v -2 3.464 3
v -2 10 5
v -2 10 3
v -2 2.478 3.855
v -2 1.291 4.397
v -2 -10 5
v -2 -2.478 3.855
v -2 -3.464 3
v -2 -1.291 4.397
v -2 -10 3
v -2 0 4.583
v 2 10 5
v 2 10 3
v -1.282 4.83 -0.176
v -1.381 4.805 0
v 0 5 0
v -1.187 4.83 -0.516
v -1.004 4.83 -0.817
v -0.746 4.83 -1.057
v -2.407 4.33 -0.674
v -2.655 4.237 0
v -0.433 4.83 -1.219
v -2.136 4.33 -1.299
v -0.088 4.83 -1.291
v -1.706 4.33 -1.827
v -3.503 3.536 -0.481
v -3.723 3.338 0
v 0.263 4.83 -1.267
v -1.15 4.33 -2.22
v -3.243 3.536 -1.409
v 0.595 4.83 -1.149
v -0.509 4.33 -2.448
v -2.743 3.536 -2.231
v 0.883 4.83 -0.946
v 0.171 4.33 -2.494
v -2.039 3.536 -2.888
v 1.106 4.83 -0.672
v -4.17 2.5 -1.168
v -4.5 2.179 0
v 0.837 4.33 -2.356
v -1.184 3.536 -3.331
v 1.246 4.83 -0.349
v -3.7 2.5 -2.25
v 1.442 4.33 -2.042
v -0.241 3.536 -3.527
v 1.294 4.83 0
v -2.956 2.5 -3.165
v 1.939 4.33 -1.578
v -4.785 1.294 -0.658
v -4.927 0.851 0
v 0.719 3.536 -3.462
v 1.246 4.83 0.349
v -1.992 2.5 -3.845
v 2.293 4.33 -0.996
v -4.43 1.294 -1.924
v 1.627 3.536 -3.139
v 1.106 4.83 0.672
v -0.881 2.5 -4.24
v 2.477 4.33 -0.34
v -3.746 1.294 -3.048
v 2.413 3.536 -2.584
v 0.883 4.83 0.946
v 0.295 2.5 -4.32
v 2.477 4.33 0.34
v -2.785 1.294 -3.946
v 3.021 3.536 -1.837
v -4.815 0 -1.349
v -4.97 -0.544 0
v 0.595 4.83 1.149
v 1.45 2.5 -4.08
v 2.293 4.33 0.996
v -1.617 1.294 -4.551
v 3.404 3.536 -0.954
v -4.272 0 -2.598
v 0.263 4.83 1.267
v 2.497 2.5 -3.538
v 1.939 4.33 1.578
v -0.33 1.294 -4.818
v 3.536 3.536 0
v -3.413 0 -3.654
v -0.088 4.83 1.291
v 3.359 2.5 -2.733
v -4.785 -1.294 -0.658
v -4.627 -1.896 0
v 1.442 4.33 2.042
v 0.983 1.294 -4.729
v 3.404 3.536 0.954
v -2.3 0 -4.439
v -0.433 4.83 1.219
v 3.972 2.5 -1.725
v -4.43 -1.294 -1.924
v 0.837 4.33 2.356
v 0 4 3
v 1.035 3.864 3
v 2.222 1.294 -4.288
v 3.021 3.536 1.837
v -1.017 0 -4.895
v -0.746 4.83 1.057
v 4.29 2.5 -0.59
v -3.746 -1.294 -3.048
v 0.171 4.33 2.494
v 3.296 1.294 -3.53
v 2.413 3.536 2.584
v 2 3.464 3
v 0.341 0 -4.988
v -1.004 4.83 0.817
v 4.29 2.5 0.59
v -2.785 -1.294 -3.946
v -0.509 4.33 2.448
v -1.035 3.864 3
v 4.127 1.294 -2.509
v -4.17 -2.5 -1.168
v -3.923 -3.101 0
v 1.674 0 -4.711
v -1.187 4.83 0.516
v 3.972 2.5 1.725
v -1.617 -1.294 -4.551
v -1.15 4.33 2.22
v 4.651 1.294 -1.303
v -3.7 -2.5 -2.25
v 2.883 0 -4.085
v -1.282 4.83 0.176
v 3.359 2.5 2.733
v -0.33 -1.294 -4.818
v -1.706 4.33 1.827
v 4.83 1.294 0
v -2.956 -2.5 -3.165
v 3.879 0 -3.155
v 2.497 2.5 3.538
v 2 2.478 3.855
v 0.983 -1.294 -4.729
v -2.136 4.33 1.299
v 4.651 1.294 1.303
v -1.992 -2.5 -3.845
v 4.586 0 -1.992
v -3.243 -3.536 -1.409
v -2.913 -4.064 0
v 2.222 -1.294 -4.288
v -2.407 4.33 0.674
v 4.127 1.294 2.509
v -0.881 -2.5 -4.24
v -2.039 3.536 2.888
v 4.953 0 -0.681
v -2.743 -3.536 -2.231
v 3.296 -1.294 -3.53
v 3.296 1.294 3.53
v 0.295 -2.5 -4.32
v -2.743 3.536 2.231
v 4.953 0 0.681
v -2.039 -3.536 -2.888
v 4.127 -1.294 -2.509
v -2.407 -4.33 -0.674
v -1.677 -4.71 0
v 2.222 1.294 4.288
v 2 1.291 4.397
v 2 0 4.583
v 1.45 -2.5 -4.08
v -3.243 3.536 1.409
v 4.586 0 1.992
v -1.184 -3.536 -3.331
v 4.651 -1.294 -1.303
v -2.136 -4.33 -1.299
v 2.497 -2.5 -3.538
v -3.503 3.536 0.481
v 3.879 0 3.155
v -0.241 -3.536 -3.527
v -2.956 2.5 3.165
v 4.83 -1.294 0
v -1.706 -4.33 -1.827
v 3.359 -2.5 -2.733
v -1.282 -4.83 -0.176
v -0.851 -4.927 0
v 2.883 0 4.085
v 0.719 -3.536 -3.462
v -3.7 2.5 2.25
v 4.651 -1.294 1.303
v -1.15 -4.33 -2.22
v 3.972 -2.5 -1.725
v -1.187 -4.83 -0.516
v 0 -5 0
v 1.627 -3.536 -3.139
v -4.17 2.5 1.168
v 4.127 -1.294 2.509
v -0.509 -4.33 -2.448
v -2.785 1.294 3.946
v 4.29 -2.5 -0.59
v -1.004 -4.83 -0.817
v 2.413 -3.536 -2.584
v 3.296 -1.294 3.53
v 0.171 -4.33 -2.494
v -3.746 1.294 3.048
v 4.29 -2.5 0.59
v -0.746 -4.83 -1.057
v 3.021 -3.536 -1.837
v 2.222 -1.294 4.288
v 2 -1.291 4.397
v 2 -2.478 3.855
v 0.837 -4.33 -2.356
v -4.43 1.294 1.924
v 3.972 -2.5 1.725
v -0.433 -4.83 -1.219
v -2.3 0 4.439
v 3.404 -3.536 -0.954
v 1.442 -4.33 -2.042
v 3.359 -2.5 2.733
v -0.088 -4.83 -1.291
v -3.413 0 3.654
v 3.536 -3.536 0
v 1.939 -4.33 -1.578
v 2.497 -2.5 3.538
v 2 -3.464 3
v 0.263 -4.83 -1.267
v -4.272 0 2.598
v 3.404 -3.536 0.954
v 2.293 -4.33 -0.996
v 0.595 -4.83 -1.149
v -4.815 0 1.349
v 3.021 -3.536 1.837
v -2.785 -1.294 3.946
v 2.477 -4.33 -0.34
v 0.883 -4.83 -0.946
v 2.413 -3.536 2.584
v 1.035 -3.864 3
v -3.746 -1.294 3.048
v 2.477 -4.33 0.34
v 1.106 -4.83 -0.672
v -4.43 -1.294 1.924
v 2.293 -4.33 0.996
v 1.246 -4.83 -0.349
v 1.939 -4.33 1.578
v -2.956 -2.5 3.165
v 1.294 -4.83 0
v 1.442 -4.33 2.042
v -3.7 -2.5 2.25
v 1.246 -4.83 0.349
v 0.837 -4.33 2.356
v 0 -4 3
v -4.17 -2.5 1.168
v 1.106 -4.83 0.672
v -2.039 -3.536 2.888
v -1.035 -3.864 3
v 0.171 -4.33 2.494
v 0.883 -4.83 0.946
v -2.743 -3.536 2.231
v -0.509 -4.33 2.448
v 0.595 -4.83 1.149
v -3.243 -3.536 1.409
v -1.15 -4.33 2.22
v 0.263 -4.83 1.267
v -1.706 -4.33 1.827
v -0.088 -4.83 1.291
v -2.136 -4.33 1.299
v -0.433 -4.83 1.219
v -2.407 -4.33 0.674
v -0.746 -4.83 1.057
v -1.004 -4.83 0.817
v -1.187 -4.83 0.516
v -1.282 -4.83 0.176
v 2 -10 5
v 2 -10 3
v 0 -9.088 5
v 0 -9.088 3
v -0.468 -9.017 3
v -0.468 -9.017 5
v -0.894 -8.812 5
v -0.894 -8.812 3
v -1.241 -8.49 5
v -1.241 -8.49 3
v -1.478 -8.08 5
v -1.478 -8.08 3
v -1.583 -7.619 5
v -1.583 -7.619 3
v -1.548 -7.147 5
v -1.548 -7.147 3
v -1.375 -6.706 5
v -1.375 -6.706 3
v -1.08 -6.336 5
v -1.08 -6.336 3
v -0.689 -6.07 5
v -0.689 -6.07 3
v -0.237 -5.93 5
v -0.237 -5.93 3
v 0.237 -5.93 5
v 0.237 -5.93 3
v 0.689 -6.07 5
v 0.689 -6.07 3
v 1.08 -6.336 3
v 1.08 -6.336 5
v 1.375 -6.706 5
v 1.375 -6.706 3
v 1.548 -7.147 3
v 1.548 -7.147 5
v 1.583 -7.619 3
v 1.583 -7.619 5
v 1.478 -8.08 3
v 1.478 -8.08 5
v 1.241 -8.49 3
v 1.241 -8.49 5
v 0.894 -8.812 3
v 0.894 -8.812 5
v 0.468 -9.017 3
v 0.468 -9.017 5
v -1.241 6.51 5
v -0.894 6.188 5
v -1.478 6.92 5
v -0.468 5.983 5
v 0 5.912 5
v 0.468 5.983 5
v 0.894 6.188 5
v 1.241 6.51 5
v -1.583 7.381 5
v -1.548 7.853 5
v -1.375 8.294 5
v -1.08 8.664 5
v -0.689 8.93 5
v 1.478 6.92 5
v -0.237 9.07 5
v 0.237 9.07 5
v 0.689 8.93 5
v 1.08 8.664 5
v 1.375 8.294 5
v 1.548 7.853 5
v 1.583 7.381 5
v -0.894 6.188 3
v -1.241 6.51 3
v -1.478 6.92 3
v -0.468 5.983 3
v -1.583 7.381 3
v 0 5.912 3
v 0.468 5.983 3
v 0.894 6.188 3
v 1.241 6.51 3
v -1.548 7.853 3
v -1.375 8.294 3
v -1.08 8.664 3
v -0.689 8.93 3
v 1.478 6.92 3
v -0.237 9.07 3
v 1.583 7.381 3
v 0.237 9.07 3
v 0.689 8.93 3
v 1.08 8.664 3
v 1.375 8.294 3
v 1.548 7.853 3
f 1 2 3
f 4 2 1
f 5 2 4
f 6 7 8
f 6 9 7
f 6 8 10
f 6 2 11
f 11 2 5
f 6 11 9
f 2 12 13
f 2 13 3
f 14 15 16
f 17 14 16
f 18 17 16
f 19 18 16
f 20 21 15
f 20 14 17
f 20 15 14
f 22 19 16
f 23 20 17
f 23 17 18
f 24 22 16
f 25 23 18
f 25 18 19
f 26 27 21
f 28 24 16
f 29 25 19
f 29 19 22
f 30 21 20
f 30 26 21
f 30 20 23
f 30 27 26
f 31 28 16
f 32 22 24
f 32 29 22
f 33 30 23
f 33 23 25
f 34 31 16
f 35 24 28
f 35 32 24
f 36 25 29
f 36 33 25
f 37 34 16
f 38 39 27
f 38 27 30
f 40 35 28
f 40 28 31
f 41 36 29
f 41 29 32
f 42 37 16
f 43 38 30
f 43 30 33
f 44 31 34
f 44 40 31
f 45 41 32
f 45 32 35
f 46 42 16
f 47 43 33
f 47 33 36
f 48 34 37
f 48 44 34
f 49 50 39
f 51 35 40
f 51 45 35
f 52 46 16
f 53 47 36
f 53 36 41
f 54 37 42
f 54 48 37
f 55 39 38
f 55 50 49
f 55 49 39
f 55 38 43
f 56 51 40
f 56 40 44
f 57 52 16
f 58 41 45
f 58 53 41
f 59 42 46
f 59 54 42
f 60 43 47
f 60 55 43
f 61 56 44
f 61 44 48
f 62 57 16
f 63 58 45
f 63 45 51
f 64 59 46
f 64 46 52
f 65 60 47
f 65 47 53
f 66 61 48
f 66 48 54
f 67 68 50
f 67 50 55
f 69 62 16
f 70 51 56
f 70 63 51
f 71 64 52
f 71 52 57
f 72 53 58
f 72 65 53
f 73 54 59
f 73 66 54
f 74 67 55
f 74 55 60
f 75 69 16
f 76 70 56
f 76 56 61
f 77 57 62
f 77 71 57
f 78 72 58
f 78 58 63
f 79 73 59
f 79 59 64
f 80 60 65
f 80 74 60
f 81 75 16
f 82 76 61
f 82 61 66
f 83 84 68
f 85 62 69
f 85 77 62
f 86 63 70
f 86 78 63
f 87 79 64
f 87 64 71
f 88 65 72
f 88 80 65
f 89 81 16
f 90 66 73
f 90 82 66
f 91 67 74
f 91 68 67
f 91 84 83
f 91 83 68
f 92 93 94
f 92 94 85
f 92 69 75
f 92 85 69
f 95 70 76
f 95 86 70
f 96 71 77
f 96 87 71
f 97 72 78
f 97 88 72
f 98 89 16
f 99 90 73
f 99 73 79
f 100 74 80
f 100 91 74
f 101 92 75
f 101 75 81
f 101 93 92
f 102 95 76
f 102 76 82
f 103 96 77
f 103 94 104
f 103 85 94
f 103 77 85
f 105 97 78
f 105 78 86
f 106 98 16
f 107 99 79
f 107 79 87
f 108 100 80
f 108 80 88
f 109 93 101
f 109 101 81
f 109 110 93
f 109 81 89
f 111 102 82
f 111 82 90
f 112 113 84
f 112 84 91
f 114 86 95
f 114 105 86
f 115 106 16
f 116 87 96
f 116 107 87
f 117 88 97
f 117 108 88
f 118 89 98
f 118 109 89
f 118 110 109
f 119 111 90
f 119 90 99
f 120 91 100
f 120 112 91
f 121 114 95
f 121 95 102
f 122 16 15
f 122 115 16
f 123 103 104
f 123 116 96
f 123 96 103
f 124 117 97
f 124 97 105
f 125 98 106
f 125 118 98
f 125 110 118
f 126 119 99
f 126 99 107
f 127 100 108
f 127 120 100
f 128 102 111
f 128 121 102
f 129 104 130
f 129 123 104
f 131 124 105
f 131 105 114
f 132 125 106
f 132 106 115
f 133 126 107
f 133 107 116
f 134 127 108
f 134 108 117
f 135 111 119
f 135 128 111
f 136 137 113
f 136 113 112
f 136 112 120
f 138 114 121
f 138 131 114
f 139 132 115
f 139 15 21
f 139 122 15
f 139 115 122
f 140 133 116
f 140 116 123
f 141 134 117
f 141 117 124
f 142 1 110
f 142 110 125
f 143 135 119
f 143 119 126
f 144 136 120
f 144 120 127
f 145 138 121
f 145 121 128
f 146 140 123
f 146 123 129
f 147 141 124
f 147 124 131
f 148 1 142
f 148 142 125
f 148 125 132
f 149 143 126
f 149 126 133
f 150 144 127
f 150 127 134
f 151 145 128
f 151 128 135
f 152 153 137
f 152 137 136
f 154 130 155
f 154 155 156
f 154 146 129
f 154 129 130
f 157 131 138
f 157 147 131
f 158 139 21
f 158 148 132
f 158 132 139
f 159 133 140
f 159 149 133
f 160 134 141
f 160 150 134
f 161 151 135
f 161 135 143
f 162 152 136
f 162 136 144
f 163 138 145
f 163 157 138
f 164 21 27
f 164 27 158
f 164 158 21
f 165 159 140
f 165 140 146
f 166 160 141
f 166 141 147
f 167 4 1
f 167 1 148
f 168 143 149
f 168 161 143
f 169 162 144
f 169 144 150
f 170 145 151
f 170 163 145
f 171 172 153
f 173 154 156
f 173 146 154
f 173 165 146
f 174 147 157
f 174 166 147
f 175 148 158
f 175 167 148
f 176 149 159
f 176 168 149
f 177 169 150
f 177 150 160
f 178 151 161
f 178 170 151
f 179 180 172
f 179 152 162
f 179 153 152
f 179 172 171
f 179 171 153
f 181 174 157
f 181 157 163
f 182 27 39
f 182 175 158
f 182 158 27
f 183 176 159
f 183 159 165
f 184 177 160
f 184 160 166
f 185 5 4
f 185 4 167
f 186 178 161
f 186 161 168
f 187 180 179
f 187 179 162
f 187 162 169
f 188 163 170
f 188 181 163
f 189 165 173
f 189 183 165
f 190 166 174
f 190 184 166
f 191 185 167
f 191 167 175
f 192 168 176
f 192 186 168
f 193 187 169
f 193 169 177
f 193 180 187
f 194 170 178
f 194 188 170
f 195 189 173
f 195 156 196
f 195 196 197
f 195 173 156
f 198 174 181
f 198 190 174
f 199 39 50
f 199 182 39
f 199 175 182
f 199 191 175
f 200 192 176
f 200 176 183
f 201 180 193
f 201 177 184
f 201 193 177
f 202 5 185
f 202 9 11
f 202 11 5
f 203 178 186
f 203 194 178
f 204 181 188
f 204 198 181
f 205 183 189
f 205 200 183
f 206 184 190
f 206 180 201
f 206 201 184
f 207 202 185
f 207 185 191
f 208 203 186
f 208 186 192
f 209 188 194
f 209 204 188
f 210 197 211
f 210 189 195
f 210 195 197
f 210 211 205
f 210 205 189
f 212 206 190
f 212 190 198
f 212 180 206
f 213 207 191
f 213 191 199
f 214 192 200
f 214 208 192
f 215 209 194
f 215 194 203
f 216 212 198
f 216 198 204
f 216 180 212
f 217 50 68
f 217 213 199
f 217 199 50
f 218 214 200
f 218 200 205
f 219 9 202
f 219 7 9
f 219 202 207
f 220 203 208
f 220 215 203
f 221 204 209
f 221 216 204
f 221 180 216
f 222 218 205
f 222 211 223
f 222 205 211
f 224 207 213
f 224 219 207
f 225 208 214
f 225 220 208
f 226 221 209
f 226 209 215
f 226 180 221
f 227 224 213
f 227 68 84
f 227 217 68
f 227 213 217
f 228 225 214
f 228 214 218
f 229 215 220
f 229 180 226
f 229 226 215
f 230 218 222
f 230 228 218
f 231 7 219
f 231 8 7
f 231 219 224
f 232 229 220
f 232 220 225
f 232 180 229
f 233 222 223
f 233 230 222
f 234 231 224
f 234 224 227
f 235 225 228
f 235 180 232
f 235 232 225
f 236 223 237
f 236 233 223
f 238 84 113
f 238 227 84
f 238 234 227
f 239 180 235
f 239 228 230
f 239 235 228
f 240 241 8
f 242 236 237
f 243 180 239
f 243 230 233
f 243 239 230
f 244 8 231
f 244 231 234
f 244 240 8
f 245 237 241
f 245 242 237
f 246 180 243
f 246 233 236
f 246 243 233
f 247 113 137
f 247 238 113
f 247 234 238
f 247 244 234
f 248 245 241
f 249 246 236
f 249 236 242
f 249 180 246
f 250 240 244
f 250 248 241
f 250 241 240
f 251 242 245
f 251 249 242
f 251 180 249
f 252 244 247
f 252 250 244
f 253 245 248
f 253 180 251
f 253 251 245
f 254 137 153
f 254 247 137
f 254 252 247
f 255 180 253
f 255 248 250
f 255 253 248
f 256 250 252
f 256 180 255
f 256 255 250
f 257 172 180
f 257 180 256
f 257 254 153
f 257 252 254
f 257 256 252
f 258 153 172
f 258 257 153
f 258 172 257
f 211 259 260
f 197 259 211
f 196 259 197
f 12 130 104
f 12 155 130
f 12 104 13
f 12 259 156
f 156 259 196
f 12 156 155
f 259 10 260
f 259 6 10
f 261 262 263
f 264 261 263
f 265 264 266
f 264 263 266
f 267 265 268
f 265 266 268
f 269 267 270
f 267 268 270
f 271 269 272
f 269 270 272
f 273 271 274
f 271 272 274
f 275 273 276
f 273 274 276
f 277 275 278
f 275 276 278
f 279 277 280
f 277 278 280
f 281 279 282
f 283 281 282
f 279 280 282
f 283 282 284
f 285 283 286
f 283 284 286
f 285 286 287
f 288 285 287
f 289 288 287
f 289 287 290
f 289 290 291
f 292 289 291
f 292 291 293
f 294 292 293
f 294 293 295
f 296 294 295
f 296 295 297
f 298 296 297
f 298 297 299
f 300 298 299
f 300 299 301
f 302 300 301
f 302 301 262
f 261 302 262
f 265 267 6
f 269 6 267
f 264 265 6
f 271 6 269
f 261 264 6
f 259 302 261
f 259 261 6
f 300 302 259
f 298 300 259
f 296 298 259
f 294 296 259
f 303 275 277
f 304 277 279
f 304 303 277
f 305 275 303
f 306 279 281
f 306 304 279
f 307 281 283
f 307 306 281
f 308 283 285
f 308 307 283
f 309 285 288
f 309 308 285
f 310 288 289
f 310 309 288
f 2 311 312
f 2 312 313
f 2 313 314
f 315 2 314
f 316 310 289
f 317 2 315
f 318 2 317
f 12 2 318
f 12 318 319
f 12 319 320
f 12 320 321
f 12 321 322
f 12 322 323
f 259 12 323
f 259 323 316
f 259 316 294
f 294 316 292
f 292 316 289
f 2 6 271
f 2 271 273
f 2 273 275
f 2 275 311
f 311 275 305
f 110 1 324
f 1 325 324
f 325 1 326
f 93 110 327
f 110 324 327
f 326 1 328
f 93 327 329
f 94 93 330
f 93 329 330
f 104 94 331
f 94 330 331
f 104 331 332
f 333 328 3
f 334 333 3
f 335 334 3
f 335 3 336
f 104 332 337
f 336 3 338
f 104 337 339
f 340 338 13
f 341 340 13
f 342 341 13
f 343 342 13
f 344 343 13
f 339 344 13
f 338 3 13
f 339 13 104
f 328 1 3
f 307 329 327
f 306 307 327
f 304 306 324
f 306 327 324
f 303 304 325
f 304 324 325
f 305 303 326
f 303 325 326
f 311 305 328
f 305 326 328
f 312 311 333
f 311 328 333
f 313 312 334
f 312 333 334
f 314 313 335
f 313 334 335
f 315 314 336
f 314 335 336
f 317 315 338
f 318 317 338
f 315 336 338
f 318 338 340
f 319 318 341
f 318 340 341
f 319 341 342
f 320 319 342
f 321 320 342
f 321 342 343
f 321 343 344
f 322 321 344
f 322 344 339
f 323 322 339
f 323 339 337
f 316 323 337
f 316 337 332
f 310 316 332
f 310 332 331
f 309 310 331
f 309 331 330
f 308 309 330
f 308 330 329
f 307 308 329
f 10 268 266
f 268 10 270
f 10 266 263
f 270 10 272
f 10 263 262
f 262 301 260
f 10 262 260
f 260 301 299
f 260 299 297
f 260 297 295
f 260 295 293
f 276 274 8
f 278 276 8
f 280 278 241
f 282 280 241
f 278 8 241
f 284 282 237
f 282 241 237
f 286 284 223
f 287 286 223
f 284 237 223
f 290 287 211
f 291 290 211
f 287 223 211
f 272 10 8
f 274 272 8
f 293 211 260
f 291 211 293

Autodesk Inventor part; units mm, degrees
ref_plane "YZ Plane" through (0, 0, 0) normal (1, 0, 0) x (0, 1, 0)
ref_plane "XZ Plane" through (0, 0, 0) normal (0, 1, 0) x (-1, 0, 0)
sketch "Boceto1" plane through (0, 0, 0) normal (0, 0, 1) x (1, 0, 0)
  arc A0 (0, 5) -> (0, -5) centre (0, 0) ccw
  line L0 (0, 5) -> (0, -5)
revolve "Revolución1" add sketch "Boceto1" angle 360 about axis through (0, 5, 0) along (0, -1, 0)
ref_plane "Plano de trabajo1" through (0, 0, 5) normal (0, 0, 1) x (1, 0, 0)
sketch "Boceto2" plane through (0, 0, 5) normal (0, 0, 1) x (1, 0, 0)
  line L0 (-2, -10) -> (2, -10)
  line L1 (2, -10) -> (2, 10)
  line L2 (2, 10) -> (-2, 10)
  line L3 (-2, 10) -> (-2, -10)
  line L4 (-2, -10) -> (2, 10) construction
  line L5 (2, -10) -> (-2, 10) construction
  point P0 (0, 0)
  dimension "d3" = 4
  dimension "d4" = 20
extrude "Extrusión1" add sketch "Boceto2" against normal blind 2
sketch "Boceto3" plane through (0, 0, 5) normal (0, 0, 1) x (1, 0, 0)
  point P0 (0, 0)
  point P1 (0, 7.5)
  point P2 (0, -7.5)
hole "Agujero1" at (0, 7.5, 5) at (0, -7.5, 5) direction (0, 0, -1) diameter 3.175 end through all
properties part number "Rueda trasera"
